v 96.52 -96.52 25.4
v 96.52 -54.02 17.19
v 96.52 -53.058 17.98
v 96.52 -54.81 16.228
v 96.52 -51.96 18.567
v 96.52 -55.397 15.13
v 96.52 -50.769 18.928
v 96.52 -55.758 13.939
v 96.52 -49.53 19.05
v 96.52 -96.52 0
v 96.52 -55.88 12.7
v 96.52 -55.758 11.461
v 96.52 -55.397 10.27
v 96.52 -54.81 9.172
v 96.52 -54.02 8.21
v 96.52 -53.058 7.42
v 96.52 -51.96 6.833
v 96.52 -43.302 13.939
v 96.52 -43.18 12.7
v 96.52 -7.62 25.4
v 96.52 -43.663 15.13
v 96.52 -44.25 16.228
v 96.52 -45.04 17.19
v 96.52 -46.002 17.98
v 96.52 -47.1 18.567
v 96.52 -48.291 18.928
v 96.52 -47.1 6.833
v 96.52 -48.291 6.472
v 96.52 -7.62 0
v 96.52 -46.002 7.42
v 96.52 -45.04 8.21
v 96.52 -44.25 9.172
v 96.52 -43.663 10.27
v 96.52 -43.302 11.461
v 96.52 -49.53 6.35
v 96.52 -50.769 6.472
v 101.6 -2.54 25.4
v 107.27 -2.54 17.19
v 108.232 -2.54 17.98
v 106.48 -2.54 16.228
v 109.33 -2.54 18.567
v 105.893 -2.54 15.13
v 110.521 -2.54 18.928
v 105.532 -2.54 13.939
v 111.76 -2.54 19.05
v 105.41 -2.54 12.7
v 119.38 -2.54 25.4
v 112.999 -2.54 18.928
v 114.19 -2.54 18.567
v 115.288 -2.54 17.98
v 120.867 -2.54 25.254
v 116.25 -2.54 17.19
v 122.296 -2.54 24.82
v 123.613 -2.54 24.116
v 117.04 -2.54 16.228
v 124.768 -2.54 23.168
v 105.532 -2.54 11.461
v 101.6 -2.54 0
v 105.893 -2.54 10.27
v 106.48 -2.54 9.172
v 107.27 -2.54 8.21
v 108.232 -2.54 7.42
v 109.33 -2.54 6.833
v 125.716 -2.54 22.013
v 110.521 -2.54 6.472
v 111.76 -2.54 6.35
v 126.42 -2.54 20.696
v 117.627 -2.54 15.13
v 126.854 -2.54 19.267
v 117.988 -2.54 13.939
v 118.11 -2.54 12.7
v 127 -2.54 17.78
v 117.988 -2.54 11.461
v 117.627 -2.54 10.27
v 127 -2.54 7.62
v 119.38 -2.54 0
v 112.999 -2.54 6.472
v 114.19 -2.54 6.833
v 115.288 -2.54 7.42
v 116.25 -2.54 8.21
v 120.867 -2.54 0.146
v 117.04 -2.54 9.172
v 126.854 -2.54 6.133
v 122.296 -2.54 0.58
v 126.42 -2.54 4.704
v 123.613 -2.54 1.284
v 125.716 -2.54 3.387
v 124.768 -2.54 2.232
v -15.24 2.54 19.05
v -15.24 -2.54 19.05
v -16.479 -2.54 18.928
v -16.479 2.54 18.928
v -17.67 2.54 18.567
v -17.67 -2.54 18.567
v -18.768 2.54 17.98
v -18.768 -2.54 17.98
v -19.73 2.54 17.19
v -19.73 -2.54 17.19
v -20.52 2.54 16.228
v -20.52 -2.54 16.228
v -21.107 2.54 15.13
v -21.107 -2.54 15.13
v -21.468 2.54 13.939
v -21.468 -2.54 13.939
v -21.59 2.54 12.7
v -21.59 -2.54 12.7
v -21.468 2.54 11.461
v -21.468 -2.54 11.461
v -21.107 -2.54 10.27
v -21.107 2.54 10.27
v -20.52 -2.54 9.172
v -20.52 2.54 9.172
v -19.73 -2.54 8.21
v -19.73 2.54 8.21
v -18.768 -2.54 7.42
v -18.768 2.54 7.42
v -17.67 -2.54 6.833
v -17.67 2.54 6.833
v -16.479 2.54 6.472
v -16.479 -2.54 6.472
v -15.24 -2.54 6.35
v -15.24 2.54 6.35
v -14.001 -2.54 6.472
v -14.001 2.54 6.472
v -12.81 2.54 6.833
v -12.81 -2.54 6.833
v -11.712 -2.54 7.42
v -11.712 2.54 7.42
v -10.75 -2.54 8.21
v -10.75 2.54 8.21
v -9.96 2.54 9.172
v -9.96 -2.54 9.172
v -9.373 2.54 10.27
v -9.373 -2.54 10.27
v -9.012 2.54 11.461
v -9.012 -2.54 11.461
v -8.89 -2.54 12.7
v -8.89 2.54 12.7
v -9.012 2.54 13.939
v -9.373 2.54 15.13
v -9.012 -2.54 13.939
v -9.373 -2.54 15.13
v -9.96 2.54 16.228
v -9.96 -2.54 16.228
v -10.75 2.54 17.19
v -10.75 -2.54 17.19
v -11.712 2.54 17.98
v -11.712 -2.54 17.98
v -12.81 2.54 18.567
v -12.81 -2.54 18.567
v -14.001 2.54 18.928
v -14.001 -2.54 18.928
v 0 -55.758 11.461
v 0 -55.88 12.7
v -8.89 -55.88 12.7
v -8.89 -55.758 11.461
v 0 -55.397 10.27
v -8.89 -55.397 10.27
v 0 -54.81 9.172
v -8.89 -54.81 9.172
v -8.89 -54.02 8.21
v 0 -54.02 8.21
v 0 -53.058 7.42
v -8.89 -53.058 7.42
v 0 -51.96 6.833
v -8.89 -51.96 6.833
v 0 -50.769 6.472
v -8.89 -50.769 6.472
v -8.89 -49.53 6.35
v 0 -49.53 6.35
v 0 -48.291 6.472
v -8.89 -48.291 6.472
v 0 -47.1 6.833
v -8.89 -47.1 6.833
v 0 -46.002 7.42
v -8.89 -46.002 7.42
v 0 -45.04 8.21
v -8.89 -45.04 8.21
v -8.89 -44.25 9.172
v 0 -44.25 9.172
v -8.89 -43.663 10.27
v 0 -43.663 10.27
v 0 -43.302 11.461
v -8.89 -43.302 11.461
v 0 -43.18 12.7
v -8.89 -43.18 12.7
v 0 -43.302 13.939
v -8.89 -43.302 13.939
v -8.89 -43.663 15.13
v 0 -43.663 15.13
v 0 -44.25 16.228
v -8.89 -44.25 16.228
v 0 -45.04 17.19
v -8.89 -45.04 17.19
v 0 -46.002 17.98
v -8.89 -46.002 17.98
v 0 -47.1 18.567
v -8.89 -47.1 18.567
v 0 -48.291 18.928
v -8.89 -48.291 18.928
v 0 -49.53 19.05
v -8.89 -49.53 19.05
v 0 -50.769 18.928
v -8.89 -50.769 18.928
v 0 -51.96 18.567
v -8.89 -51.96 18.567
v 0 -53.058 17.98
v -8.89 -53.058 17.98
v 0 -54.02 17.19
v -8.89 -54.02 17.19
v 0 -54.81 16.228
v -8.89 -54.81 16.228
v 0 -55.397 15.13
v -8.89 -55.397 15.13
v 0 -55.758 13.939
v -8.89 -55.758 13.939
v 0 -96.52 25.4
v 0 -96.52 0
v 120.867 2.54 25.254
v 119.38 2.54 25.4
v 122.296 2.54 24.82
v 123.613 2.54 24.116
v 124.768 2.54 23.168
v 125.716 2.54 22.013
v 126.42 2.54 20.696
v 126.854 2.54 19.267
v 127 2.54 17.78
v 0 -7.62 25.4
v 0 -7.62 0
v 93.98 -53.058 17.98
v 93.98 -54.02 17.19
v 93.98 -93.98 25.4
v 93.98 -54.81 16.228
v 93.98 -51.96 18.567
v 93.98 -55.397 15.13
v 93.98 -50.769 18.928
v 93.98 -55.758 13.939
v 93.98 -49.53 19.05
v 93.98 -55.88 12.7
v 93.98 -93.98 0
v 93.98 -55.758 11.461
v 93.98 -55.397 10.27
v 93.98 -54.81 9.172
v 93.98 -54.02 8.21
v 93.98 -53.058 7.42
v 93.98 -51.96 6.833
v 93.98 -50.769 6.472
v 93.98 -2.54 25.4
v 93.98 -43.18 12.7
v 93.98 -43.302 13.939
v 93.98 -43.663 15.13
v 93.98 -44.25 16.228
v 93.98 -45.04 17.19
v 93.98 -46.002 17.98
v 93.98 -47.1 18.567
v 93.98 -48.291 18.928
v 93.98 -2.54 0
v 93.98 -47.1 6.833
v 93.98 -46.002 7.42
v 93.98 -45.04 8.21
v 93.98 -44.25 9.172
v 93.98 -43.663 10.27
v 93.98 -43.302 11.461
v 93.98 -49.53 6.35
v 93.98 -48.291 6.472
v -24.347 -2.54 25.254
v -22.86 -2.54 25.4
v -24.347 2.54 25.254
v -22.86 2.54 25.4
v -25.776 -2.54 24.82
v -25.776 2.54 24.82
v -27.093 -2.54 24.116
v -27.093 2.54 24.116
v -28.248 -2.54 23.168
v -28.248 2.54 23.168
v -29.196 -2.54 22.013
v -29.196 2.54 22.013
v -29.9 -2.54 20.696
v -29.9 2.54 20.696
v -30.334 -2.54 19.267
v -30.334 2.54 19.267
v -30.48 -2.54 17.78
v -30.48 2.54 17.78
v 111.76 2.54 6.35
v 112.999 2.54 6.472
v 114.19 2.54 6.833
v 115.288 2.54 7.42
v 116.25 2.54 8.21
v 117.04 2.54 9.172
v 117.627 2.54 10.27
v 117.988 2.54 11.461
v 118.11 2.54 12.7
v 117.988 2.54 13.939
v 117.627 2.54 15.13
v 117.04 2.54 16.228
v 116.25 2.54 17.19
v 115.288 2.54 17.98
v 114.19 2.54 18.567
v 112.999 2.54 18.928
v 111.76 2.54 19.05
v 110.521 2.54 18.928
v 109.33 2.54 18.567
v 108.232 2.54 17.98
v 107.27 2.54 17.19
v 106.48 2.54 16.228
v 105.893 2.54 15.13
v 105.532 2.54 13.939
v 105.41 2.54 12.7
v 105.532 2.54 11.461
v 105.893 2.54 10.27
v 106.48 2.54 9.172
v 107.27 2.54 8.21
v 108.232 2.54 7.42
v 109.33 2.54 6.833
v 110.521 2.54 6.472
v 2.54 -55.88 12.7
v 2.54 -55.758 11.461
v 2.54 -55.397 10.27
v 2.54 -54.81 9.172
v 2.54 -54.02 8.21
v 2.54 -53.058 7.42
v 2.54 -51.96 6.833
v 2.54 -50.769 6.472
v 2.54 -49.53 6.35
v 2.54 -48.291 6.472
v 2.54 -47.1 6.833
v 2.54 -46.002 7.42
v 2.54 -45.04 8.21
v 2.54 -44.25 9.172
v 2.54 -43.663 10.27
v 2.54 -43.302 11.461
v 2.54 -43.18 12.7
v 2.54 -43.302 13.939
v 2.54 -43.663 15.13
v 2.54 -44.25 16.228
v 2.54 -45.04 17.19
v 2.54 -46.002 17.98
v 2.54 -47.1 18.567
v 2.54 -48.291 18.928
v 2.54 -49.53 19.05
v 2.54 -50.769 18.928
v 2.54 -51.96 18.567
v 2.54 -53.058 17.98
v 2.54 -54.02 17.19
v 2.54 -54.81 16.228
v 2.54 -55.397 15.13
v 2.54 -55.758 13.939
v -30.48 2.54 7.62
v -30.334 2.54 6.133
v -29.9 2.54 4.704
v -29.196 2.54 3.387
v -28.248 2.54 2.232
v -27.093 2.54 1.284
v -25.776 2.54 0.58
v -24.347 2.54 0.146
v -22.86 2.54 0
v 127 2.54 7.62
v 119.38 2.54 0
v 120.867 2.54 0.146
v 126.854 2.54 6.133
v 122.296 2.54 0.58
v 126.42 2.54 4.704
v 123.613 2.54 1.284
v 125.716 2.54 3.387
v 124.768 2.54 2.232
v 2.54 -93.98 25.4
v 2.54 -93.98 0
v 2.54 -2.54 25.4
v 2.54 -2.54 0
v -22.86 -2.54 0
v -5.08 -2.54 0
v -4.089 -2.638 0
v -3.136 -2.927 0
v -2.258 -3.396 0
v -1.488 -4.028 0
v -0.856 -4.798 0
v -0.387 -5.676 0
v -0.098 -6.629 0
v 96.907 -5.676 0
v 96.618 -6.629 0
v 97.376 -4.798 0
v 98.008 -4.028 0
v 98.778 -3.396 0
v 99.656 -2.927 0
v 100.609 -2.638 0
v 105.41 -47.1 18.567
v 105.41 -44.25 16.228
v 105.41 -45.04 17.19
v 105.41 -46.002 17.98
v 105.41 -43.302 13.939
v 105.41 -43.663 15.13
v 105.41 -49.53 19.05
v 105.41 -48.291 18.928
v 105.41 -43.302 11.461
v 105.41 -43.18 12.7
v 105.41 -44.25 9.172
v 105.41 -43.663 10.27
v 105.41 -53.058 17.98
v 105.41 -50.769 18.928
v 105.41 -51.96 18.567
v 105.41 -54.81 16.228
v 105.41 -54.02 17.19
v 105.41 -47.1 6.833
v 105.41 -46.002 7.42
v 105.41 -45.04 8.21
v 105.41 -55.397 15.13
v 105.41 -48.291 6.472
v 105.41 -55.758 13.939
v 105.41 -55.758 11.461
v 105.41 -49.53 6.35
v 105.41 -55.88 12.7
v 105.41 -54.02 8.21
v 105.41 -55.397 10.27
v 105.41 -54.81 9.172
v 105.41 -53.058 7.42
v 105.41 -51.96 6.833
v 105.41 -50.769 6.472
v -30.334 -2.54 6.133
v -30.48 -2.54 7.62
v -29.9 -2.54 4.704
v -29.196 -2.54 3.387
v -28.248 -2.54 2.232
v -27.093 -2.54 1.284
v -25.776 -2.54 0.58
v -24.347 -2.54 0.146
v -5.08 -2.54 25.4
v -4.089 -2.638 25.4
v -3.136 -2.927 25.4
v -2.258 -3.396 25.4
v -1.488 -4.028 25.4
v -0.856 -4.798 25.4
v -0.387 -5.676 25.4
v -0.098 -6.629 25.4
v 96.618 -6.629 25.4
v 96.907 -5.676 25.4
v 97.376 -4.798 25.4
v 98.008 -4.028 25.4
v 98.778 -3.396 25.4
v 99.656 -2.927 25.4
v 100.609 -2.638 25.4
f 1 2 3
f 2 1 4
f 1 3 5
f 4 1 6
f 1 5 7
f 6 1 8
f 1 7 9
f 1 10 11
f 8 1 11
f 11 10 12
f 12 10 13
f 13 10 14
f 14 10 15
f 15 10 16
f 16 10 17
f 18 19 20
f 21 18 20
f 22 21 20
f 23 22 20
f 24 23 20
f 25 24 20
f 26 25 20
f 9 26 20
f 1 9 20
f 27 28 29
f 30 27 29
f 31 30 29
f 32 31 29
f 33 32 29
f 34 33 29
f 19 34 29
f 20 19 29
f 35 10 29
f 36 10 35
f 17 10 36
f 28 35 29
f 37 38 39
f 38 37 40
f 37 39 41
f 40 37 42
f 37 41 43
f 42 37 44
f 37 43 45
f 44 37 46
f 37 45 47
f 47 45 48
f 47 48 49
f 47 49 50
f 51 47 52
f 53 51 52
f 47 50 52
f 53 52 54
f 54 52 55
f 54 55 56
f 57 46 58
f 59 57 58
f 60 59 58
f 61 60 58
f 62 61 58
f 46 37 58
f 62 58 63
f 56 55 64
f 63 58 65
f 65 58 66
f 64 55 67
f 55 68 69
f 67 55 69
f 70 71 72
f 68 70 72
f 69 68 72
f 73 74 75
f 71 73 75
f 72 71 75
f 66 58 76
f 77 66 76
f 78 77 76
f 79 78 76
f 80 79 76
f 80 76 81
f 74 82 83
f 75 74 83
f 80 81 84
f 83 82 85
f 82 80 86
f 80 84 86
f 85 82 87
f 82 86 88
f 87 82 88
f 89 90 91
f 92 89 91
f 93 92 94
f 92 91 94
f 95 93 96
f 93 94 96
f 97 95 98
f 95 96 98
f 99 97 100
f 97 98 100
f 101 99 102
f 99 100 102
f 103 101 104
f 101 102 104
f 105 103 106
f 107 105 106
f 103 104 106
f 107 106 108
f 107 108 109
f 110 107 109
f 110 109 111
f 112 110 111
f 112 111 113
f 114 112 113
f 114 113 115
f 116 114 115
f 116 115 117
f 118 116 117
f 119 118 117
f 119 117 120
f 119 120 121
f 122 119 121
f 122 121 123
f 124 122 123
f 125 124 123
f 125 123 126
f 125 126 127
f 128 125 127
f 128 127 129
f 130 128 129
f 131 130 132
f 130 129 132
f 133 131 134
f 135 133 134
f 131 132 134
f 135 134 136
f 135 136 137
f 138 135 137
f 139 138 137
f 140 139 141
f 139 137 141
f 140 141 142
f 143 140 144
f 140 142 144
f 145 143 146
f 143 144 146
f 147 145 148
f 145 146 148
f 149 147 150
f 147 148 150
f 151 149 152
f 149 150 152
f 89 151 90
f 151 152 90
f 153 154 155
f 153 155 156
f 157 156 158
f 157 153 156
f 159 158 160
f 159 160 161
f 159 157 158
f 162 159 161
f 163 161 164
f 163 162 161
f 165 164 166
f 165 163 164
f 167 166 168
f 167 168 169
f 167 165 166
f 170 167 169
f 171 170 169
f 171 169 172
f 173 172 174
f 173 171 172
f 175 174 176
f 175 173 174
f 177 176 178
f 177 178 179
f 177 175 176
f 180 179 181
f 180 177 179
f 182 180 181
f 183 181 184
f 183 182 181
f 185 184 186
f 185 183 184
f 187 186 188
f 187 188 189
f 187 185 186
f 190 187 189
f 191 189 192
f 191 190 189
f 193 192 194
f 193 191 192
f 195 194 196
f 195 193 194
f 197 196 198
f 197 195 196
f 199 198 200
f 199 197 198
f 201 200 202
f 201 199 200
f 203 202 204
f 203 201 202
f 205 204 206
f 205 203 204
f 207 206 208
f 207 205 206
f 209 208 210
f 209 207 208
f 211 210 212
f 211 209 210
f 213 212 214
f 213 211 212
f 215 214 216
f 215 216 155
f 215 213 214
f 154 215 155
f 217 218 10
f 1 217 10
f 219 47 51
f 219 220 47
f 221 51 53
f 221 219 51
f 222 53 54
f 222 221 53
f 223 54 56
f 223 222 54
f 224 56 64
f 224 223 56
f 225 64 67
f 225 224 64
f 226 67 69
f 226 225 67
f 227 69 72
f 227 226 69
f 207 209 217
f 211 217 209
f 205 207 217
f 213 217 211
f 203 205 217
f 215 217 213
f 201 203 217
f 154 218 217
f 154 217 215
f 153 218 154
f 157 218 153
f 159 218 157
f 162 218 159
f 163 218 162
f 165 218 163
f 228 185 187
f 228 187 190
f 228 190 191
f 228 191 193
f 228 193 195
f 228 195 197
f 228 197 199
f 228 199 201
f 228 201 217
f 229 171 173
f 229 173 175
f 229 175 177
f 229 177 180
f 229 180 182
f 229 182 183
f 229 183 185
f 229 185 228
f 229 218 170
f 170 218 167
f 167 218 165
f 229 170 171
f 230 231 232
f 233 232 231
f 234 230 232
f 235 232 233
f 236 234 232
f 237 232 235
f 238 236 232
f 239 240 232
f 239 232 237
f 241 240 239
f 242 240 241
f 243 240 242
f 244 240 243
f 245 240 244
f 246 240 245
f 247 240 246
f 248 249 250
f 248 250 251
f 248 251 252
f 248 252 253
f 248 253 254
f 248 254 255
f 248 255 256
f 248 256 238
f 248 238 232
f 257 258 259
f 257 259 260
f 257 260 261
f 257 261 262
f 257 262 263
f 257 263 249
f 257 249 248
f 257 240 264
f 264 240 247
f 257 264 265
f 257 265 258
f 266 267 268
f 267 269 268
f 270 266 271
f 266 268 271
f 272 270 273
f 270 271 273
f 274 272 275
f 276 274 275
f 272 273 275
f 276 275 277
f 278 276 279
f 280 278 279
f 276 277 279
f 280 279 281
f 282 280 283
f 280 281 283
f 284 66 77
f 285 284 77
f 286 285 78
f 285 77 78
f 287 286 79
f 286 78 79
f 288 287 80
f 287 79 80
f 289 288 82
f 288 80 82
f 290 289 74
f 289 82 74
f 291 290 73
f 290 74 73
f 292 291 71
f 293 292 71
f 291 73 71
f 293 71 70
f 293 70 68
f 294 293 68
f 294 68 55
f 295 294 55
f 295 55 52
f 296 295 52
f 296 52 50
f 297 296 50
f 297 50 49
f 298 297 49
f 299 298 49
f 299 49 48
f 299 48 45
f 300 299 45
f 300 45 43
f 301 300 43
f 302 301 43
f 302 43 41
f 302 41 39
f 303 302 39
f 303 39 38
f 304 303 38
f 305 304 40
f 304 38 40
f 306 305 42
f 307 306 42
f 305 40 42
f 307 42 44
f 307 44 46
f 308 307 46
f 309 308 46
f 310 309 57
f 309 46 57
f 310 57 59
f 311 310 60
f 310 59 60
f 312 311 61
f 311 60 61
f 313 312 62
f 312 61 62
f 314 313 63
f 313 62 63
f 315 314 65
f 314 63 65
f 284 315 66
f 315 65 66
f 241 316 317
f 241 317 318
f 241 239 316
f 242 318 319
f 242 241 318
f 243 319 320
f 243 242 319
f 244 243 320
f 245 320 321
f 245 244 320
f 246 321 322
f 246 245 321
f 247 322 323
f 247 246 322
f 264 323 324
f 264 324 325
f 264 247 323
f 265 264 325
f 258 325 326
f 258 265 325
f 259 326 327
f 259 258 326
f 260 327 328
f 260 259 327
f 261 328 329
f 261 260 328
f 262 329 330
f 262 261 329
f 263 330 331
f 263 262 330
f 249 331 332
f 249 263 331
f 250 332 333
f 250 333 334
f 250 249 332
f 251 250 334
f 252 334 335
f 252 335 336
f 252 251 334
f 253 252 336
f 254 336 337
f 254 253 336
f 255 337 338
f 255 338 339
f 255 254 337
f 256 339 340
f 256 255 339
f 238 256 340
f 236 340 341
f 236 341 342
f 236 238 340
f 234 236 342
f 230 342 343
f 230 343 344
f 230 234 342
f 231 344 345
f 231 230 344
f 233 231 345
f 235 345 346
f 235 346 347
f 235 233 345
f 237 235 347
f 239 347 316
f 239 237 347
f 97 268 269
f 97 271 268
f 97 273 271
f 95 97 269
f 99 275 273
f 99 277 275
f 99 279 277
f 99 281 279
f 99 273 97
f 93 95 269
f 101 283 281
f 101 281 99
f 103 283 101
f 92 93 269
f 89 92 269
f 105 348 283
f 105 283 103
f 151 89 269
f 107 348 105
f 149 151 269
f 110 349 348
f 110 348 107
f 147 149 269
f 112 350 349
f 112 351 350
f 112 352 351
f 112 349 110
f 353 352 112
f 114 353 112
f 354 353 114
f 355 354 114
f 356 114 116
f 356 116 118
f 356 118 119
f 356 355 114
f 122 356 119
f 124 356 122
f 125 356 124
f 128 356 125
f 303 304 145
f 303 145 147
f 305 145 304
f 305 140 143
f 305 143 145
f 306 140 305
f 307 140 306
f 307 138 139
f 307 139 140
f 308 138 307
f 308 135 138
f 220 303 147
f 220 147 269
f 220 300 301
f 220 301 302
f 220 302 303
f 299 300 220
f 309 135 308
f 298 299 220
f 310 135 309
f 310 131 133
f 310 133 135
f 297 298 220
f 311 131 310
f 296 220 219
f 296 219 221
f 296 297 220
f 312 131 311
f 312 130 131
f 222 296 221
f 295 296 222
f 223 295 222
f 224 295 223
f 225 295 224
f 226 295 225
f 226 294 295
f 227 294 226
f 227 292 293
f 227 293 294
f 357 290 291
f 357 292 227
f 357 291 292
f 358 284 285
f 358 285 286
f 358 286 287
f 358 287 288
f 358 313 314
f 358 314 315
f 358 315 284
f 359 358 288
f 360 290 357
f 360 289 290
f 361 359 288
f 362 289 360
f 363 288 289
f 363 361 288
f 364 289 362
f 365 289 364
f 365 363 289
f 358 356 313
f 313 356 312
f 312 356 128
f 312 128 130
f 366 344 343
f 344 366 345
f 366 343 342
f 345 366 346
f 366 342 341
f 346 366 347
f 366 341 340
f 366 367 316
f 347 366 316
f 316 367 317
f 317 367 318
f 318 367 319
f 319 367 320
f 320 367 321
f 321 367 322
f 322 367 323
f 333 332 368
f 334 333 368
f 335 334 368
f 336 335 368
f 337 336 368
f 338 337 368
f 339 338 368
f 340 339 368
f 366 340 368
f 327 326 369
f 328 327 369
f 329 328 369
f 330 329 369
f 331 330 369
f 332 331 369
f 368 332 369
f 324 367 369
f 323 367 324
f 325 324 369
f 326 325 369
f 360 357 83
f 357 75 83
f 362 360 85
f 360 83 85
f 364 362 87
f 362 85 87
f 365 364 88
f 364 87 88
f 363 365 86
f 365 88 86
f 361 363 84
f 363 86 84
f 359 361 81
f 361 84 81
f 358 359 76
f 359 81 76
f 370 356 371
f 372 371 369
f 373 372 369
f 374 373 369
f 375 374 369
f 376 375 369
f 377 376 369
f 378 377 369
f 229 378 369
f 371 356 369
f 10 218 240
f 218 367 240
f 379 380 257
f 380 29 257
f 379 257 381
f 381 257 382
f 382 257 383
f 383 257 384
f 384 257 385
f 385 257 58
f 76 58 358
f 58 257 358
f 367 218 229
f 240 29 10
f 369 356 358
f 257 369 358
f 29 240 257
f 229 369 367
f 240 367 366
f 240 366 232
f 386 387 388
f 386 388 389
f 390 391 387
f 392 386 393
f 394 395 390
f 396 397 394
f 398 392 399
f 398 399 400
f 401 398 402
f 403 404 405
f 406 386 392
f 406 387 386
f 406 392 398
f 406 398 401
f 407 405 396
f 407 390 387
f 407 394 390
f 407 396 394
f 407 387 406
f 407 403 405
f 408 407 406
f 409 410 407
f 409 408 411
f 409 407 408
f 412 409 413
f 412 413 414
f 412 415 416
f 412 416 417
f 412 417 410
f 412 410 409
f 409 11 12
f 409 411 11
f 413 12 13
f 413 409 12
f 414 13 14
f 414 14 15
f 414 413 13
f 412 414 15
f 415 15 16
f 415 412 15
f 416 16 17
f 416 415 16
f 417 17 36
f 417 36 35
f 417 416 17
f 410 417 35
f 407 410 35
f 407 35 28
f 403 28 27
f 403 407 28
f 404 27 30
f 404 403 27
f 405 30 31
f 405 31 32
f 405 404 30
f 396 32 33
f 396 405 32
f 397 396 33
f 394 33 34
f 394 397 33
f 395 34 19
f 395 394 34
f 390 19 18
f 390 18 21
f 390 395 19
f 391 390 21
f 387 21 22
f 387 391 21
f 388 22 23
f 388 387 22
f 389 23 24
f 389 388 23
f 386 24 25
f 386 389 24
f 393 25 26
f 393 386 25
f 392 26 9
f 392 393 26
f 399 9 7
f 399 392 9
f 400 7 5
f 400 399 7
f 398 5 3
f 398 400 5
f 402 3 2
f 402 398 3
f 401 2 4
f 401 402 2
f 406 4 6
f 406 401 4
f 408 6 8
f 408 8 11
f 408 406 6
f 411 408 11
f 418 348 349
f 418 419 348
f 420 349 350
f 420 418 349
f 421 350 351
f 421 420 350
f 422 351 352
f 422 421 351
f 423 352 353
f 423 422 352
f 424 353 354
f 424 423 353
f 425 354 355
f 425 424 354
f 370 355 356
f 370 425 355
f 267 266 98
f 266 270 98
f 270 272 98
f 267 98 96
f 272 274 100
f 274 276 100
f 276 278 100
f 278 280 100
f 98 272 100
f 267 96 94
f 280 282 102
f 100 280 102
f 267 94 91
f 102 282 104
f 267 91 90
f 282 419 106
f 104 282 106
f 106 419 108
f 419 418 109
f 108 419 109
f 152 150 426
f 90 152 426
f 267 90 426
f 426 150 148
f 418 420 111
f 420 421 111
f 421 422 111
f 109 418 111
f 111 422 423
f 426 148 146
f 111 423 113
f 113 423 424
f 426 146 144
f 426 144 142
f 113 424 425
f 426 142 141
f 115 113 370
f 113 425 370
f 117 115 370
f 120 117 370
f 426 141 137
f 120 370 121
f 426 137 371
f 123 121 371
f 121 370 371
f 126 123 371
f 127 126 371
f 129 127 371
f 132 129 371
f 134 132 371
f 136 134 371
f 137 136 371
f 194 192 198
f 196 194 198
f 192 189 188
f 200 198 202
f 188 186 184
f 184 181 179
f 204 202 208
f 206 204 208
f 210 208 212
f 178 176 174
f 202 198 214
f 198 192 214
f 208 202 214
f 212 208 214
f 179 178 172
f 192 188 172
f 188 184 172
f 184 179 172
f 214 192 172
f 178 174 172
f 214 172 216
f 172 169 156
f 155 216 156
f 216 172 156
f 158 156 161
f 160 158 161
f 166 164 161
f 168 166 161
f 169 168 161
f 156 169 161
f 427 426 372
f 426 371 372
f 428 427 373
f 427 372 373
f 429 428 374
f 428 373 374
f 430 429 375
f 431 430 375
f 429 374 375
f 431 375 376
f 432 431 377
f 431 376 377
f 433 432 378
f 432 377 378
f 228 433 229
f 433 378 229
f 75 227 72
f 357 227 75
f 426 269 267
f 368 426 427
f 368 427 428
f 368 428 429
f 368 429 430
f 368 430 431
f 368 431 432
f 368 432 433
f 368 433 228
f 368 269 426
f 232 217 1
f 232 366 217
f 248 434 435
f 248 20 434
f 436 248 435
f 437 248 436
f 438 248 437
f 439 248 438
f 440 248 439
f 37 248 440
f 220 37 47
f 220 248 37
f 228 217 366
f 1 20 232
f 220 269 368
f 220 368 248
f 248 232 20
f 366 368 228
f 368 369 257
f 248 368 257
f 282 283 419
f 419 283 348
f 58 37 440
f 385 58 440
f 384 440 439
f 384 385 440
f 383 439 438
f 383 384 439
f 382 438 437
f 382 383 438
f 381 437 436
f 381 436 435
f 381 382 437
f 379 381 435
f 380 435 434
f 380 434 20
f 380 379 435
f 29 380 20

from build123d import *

# Parameters (mm, degrees)
SKETCH1_W           = 96.52
SKETCH1_H           = 96.52
SKETCH1_W_2         = 91.44
SKETCH1_H_2         = 91.44
BOSS_EXTRUDE1_DEPTH = 25.4
SKETCH3_W           = 157.48
SKETCH3_H           = 25.4
BOSS_EXTRUDE2_DEPTH = 2.54
FILLET1_R           = 5.08
SKETCH4_R           = 6.35
CUT_EXTRUDE2_DEPTH  = 161.02
FILLET2_R           = 7.62
SKETCH5_R           = 6.35
BOSS_EXTRUDE4_DEPTH = 57.15


with BuildPart() as part:
    # Sketch1 → Boss-Extrude1 (new body)
    with BuildSketch(Plane.XY):
        with Locations((48.26, -48.26)):
            Rectangle(SKETCH1_W, SKETCH1_H)
        with Locations((48.26, -48.26)):
            Rectangle(SKETCH1_W_2, SKETCH1_H_2, mode=Mode.SUBTRACT)
    extrude(amount=BOSS_EXTRUDE1_DEPTH)

    # Sketch3 → Boss-Extrude2 (add, symmetric)
    with BuildSketch(Plane(origin=(0, 0, 0), x_dir=(1, 0, 0), z_dir=(0, 1, 0))):
        with Locations((48.26, -12.7)):
            Rectangle(SKETCH3_W, SKETCH3_H)
    extrude(amount=BOSS_EXTRUDE2_DEPTH, both=True)

    # Fillet1
    fillet1_edges = [part.edges().sort_by_distance(p)[0] for p in [
        (0, -2.54, 12.7),
        (96.52, -2.54, 12.7),
    ]]
    fillet(fillet1_edges, radius=FILLET1_R)

    # Sketch4 → Cut-Extrude2 (cut, through all)
    with BuildSketch(Plane.XZ.offset(2.54)):
        with Locations(Location((111.76, 12.7, 0), (0, 0, 270))):
            Circle(SKETCH4_R)
        with Locations(Location((-15.24, 12.7, 0), (0, 0, 90))):
            Circle(SKETCH4_R)
    extrude(amount=-CUT_EXTRUDE2_DEPTH, mode=Mode.SUBTRACT)

    # Fillet2
    fillet2_edges = [part.edges().sort_by_distance(p)[0] for p in [
        (-30.48, 0, 25.4),
        (127, 0, 0),
        (-30.48, 0, 0),
        (127, 0, 25.4),
    ]]
    fillet(fillet2_edges, radius=FILLET2_R)

    # Sketch5 → Boss-Extrude4 (add, symmetric)
    with BuildSketch(Plane(origin=(48.26, 0, 0), x_dir=(0, 0, -1), z_dir=(1, 0, 0))):
        with Locations(Location((-12.7, -49.53, 0), (0, 0, 270))):
            Circle(SKETCH5_R)
    extrude(amount=BOSS_EXTRUDE4_DEPTH, both=True)


solid = part.part
